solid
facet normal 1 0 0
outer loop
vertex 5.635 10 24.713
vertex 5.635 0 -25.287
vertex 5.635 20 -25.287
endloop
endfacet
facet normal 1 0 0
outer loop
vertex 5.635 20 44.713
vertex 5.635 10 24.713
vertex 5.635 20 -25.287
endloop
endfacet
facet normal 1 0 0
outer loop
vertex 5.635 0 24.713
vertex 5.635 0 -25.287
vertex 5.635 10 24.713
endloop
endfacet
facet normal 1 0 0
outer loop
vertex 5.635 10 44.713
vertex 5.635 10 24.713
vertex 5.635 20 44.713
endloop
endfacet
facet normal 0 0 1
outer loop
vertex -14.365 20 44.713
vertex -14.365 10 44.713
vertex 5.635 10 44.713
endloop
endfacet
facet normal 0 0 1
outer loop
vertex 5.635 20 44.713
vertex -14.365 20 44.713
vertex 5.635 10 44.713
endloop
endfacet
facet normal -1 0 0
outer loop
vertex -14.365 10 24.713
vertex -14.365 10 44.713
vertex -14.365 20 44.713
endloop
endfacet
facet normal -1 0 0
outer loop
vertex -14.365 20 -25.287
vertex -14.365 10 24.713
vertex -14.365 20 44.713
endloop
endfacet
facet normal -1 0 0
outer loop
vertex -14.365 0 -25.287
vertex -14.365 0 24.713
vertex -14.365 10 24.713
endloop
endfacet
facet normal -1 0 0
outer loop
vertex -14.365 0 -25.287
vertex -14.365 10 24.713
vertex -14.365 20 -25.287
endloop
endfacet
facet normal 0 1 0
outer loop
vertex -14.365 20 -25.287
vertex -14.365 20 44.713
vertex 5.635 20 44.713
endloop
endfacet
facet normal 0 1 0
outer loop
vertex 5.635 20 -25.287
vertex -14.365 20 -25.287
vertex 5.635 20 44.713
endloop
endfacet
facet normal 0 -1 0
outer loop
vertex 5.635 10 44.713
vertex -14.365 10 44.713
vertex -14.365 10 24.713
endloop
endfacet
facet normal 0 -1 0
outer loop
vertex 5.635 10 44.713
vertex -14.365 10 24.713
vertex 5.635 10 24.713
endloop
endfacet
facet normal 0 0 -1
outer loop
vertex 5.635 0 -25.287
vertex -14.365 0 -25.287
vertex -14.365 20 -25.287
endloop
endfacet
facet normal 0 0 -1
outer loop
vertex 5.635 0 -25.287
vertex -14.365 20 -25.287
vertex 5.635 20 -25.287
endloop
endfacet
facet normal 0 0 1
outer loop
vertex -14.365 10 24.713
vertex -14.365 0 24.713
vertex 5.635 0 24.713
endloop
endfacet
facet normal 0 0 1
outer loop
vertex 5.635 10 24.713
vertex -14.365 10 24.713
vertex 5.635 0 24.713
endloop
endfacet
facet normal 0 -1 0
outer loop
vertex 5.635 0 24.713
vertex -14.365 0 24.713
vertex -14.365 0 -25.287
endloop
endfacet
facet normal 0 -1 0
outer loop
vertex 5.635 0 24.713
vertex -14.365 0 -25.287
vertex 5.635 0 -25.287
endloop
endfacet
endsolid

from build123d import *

# Parameters (mm, degrees)
F0_W     = 20
F0_H     = 20
F0_H_2   = 50
F1_DEPTH = 20
F2_DEPTH = 10


with BuildPart() as f1:
    # F0 (on Front) → F1 (new body)
    with BuildSketch(Plane.XZ):
        with Locations((-4.364679, 34.713301)):
            Rectangle(F0_W, F0_H)
        with Locations((-4.364679, -0.286699)):
            Rectangle(F0_W, F0_H_2)
    extrude(amount=-F1_DEPTH)

    # F0 (on Front) → F2 (cut)
    with BuildSketch(Plane.XZ):
        with Locations((-4.364679, 34.713301)):
            Rectangle(F0_W, F0_H)
    extrude(amount=-F2_DEPTH, mode=Mode.SUBTRACT)


solid = f1.part
